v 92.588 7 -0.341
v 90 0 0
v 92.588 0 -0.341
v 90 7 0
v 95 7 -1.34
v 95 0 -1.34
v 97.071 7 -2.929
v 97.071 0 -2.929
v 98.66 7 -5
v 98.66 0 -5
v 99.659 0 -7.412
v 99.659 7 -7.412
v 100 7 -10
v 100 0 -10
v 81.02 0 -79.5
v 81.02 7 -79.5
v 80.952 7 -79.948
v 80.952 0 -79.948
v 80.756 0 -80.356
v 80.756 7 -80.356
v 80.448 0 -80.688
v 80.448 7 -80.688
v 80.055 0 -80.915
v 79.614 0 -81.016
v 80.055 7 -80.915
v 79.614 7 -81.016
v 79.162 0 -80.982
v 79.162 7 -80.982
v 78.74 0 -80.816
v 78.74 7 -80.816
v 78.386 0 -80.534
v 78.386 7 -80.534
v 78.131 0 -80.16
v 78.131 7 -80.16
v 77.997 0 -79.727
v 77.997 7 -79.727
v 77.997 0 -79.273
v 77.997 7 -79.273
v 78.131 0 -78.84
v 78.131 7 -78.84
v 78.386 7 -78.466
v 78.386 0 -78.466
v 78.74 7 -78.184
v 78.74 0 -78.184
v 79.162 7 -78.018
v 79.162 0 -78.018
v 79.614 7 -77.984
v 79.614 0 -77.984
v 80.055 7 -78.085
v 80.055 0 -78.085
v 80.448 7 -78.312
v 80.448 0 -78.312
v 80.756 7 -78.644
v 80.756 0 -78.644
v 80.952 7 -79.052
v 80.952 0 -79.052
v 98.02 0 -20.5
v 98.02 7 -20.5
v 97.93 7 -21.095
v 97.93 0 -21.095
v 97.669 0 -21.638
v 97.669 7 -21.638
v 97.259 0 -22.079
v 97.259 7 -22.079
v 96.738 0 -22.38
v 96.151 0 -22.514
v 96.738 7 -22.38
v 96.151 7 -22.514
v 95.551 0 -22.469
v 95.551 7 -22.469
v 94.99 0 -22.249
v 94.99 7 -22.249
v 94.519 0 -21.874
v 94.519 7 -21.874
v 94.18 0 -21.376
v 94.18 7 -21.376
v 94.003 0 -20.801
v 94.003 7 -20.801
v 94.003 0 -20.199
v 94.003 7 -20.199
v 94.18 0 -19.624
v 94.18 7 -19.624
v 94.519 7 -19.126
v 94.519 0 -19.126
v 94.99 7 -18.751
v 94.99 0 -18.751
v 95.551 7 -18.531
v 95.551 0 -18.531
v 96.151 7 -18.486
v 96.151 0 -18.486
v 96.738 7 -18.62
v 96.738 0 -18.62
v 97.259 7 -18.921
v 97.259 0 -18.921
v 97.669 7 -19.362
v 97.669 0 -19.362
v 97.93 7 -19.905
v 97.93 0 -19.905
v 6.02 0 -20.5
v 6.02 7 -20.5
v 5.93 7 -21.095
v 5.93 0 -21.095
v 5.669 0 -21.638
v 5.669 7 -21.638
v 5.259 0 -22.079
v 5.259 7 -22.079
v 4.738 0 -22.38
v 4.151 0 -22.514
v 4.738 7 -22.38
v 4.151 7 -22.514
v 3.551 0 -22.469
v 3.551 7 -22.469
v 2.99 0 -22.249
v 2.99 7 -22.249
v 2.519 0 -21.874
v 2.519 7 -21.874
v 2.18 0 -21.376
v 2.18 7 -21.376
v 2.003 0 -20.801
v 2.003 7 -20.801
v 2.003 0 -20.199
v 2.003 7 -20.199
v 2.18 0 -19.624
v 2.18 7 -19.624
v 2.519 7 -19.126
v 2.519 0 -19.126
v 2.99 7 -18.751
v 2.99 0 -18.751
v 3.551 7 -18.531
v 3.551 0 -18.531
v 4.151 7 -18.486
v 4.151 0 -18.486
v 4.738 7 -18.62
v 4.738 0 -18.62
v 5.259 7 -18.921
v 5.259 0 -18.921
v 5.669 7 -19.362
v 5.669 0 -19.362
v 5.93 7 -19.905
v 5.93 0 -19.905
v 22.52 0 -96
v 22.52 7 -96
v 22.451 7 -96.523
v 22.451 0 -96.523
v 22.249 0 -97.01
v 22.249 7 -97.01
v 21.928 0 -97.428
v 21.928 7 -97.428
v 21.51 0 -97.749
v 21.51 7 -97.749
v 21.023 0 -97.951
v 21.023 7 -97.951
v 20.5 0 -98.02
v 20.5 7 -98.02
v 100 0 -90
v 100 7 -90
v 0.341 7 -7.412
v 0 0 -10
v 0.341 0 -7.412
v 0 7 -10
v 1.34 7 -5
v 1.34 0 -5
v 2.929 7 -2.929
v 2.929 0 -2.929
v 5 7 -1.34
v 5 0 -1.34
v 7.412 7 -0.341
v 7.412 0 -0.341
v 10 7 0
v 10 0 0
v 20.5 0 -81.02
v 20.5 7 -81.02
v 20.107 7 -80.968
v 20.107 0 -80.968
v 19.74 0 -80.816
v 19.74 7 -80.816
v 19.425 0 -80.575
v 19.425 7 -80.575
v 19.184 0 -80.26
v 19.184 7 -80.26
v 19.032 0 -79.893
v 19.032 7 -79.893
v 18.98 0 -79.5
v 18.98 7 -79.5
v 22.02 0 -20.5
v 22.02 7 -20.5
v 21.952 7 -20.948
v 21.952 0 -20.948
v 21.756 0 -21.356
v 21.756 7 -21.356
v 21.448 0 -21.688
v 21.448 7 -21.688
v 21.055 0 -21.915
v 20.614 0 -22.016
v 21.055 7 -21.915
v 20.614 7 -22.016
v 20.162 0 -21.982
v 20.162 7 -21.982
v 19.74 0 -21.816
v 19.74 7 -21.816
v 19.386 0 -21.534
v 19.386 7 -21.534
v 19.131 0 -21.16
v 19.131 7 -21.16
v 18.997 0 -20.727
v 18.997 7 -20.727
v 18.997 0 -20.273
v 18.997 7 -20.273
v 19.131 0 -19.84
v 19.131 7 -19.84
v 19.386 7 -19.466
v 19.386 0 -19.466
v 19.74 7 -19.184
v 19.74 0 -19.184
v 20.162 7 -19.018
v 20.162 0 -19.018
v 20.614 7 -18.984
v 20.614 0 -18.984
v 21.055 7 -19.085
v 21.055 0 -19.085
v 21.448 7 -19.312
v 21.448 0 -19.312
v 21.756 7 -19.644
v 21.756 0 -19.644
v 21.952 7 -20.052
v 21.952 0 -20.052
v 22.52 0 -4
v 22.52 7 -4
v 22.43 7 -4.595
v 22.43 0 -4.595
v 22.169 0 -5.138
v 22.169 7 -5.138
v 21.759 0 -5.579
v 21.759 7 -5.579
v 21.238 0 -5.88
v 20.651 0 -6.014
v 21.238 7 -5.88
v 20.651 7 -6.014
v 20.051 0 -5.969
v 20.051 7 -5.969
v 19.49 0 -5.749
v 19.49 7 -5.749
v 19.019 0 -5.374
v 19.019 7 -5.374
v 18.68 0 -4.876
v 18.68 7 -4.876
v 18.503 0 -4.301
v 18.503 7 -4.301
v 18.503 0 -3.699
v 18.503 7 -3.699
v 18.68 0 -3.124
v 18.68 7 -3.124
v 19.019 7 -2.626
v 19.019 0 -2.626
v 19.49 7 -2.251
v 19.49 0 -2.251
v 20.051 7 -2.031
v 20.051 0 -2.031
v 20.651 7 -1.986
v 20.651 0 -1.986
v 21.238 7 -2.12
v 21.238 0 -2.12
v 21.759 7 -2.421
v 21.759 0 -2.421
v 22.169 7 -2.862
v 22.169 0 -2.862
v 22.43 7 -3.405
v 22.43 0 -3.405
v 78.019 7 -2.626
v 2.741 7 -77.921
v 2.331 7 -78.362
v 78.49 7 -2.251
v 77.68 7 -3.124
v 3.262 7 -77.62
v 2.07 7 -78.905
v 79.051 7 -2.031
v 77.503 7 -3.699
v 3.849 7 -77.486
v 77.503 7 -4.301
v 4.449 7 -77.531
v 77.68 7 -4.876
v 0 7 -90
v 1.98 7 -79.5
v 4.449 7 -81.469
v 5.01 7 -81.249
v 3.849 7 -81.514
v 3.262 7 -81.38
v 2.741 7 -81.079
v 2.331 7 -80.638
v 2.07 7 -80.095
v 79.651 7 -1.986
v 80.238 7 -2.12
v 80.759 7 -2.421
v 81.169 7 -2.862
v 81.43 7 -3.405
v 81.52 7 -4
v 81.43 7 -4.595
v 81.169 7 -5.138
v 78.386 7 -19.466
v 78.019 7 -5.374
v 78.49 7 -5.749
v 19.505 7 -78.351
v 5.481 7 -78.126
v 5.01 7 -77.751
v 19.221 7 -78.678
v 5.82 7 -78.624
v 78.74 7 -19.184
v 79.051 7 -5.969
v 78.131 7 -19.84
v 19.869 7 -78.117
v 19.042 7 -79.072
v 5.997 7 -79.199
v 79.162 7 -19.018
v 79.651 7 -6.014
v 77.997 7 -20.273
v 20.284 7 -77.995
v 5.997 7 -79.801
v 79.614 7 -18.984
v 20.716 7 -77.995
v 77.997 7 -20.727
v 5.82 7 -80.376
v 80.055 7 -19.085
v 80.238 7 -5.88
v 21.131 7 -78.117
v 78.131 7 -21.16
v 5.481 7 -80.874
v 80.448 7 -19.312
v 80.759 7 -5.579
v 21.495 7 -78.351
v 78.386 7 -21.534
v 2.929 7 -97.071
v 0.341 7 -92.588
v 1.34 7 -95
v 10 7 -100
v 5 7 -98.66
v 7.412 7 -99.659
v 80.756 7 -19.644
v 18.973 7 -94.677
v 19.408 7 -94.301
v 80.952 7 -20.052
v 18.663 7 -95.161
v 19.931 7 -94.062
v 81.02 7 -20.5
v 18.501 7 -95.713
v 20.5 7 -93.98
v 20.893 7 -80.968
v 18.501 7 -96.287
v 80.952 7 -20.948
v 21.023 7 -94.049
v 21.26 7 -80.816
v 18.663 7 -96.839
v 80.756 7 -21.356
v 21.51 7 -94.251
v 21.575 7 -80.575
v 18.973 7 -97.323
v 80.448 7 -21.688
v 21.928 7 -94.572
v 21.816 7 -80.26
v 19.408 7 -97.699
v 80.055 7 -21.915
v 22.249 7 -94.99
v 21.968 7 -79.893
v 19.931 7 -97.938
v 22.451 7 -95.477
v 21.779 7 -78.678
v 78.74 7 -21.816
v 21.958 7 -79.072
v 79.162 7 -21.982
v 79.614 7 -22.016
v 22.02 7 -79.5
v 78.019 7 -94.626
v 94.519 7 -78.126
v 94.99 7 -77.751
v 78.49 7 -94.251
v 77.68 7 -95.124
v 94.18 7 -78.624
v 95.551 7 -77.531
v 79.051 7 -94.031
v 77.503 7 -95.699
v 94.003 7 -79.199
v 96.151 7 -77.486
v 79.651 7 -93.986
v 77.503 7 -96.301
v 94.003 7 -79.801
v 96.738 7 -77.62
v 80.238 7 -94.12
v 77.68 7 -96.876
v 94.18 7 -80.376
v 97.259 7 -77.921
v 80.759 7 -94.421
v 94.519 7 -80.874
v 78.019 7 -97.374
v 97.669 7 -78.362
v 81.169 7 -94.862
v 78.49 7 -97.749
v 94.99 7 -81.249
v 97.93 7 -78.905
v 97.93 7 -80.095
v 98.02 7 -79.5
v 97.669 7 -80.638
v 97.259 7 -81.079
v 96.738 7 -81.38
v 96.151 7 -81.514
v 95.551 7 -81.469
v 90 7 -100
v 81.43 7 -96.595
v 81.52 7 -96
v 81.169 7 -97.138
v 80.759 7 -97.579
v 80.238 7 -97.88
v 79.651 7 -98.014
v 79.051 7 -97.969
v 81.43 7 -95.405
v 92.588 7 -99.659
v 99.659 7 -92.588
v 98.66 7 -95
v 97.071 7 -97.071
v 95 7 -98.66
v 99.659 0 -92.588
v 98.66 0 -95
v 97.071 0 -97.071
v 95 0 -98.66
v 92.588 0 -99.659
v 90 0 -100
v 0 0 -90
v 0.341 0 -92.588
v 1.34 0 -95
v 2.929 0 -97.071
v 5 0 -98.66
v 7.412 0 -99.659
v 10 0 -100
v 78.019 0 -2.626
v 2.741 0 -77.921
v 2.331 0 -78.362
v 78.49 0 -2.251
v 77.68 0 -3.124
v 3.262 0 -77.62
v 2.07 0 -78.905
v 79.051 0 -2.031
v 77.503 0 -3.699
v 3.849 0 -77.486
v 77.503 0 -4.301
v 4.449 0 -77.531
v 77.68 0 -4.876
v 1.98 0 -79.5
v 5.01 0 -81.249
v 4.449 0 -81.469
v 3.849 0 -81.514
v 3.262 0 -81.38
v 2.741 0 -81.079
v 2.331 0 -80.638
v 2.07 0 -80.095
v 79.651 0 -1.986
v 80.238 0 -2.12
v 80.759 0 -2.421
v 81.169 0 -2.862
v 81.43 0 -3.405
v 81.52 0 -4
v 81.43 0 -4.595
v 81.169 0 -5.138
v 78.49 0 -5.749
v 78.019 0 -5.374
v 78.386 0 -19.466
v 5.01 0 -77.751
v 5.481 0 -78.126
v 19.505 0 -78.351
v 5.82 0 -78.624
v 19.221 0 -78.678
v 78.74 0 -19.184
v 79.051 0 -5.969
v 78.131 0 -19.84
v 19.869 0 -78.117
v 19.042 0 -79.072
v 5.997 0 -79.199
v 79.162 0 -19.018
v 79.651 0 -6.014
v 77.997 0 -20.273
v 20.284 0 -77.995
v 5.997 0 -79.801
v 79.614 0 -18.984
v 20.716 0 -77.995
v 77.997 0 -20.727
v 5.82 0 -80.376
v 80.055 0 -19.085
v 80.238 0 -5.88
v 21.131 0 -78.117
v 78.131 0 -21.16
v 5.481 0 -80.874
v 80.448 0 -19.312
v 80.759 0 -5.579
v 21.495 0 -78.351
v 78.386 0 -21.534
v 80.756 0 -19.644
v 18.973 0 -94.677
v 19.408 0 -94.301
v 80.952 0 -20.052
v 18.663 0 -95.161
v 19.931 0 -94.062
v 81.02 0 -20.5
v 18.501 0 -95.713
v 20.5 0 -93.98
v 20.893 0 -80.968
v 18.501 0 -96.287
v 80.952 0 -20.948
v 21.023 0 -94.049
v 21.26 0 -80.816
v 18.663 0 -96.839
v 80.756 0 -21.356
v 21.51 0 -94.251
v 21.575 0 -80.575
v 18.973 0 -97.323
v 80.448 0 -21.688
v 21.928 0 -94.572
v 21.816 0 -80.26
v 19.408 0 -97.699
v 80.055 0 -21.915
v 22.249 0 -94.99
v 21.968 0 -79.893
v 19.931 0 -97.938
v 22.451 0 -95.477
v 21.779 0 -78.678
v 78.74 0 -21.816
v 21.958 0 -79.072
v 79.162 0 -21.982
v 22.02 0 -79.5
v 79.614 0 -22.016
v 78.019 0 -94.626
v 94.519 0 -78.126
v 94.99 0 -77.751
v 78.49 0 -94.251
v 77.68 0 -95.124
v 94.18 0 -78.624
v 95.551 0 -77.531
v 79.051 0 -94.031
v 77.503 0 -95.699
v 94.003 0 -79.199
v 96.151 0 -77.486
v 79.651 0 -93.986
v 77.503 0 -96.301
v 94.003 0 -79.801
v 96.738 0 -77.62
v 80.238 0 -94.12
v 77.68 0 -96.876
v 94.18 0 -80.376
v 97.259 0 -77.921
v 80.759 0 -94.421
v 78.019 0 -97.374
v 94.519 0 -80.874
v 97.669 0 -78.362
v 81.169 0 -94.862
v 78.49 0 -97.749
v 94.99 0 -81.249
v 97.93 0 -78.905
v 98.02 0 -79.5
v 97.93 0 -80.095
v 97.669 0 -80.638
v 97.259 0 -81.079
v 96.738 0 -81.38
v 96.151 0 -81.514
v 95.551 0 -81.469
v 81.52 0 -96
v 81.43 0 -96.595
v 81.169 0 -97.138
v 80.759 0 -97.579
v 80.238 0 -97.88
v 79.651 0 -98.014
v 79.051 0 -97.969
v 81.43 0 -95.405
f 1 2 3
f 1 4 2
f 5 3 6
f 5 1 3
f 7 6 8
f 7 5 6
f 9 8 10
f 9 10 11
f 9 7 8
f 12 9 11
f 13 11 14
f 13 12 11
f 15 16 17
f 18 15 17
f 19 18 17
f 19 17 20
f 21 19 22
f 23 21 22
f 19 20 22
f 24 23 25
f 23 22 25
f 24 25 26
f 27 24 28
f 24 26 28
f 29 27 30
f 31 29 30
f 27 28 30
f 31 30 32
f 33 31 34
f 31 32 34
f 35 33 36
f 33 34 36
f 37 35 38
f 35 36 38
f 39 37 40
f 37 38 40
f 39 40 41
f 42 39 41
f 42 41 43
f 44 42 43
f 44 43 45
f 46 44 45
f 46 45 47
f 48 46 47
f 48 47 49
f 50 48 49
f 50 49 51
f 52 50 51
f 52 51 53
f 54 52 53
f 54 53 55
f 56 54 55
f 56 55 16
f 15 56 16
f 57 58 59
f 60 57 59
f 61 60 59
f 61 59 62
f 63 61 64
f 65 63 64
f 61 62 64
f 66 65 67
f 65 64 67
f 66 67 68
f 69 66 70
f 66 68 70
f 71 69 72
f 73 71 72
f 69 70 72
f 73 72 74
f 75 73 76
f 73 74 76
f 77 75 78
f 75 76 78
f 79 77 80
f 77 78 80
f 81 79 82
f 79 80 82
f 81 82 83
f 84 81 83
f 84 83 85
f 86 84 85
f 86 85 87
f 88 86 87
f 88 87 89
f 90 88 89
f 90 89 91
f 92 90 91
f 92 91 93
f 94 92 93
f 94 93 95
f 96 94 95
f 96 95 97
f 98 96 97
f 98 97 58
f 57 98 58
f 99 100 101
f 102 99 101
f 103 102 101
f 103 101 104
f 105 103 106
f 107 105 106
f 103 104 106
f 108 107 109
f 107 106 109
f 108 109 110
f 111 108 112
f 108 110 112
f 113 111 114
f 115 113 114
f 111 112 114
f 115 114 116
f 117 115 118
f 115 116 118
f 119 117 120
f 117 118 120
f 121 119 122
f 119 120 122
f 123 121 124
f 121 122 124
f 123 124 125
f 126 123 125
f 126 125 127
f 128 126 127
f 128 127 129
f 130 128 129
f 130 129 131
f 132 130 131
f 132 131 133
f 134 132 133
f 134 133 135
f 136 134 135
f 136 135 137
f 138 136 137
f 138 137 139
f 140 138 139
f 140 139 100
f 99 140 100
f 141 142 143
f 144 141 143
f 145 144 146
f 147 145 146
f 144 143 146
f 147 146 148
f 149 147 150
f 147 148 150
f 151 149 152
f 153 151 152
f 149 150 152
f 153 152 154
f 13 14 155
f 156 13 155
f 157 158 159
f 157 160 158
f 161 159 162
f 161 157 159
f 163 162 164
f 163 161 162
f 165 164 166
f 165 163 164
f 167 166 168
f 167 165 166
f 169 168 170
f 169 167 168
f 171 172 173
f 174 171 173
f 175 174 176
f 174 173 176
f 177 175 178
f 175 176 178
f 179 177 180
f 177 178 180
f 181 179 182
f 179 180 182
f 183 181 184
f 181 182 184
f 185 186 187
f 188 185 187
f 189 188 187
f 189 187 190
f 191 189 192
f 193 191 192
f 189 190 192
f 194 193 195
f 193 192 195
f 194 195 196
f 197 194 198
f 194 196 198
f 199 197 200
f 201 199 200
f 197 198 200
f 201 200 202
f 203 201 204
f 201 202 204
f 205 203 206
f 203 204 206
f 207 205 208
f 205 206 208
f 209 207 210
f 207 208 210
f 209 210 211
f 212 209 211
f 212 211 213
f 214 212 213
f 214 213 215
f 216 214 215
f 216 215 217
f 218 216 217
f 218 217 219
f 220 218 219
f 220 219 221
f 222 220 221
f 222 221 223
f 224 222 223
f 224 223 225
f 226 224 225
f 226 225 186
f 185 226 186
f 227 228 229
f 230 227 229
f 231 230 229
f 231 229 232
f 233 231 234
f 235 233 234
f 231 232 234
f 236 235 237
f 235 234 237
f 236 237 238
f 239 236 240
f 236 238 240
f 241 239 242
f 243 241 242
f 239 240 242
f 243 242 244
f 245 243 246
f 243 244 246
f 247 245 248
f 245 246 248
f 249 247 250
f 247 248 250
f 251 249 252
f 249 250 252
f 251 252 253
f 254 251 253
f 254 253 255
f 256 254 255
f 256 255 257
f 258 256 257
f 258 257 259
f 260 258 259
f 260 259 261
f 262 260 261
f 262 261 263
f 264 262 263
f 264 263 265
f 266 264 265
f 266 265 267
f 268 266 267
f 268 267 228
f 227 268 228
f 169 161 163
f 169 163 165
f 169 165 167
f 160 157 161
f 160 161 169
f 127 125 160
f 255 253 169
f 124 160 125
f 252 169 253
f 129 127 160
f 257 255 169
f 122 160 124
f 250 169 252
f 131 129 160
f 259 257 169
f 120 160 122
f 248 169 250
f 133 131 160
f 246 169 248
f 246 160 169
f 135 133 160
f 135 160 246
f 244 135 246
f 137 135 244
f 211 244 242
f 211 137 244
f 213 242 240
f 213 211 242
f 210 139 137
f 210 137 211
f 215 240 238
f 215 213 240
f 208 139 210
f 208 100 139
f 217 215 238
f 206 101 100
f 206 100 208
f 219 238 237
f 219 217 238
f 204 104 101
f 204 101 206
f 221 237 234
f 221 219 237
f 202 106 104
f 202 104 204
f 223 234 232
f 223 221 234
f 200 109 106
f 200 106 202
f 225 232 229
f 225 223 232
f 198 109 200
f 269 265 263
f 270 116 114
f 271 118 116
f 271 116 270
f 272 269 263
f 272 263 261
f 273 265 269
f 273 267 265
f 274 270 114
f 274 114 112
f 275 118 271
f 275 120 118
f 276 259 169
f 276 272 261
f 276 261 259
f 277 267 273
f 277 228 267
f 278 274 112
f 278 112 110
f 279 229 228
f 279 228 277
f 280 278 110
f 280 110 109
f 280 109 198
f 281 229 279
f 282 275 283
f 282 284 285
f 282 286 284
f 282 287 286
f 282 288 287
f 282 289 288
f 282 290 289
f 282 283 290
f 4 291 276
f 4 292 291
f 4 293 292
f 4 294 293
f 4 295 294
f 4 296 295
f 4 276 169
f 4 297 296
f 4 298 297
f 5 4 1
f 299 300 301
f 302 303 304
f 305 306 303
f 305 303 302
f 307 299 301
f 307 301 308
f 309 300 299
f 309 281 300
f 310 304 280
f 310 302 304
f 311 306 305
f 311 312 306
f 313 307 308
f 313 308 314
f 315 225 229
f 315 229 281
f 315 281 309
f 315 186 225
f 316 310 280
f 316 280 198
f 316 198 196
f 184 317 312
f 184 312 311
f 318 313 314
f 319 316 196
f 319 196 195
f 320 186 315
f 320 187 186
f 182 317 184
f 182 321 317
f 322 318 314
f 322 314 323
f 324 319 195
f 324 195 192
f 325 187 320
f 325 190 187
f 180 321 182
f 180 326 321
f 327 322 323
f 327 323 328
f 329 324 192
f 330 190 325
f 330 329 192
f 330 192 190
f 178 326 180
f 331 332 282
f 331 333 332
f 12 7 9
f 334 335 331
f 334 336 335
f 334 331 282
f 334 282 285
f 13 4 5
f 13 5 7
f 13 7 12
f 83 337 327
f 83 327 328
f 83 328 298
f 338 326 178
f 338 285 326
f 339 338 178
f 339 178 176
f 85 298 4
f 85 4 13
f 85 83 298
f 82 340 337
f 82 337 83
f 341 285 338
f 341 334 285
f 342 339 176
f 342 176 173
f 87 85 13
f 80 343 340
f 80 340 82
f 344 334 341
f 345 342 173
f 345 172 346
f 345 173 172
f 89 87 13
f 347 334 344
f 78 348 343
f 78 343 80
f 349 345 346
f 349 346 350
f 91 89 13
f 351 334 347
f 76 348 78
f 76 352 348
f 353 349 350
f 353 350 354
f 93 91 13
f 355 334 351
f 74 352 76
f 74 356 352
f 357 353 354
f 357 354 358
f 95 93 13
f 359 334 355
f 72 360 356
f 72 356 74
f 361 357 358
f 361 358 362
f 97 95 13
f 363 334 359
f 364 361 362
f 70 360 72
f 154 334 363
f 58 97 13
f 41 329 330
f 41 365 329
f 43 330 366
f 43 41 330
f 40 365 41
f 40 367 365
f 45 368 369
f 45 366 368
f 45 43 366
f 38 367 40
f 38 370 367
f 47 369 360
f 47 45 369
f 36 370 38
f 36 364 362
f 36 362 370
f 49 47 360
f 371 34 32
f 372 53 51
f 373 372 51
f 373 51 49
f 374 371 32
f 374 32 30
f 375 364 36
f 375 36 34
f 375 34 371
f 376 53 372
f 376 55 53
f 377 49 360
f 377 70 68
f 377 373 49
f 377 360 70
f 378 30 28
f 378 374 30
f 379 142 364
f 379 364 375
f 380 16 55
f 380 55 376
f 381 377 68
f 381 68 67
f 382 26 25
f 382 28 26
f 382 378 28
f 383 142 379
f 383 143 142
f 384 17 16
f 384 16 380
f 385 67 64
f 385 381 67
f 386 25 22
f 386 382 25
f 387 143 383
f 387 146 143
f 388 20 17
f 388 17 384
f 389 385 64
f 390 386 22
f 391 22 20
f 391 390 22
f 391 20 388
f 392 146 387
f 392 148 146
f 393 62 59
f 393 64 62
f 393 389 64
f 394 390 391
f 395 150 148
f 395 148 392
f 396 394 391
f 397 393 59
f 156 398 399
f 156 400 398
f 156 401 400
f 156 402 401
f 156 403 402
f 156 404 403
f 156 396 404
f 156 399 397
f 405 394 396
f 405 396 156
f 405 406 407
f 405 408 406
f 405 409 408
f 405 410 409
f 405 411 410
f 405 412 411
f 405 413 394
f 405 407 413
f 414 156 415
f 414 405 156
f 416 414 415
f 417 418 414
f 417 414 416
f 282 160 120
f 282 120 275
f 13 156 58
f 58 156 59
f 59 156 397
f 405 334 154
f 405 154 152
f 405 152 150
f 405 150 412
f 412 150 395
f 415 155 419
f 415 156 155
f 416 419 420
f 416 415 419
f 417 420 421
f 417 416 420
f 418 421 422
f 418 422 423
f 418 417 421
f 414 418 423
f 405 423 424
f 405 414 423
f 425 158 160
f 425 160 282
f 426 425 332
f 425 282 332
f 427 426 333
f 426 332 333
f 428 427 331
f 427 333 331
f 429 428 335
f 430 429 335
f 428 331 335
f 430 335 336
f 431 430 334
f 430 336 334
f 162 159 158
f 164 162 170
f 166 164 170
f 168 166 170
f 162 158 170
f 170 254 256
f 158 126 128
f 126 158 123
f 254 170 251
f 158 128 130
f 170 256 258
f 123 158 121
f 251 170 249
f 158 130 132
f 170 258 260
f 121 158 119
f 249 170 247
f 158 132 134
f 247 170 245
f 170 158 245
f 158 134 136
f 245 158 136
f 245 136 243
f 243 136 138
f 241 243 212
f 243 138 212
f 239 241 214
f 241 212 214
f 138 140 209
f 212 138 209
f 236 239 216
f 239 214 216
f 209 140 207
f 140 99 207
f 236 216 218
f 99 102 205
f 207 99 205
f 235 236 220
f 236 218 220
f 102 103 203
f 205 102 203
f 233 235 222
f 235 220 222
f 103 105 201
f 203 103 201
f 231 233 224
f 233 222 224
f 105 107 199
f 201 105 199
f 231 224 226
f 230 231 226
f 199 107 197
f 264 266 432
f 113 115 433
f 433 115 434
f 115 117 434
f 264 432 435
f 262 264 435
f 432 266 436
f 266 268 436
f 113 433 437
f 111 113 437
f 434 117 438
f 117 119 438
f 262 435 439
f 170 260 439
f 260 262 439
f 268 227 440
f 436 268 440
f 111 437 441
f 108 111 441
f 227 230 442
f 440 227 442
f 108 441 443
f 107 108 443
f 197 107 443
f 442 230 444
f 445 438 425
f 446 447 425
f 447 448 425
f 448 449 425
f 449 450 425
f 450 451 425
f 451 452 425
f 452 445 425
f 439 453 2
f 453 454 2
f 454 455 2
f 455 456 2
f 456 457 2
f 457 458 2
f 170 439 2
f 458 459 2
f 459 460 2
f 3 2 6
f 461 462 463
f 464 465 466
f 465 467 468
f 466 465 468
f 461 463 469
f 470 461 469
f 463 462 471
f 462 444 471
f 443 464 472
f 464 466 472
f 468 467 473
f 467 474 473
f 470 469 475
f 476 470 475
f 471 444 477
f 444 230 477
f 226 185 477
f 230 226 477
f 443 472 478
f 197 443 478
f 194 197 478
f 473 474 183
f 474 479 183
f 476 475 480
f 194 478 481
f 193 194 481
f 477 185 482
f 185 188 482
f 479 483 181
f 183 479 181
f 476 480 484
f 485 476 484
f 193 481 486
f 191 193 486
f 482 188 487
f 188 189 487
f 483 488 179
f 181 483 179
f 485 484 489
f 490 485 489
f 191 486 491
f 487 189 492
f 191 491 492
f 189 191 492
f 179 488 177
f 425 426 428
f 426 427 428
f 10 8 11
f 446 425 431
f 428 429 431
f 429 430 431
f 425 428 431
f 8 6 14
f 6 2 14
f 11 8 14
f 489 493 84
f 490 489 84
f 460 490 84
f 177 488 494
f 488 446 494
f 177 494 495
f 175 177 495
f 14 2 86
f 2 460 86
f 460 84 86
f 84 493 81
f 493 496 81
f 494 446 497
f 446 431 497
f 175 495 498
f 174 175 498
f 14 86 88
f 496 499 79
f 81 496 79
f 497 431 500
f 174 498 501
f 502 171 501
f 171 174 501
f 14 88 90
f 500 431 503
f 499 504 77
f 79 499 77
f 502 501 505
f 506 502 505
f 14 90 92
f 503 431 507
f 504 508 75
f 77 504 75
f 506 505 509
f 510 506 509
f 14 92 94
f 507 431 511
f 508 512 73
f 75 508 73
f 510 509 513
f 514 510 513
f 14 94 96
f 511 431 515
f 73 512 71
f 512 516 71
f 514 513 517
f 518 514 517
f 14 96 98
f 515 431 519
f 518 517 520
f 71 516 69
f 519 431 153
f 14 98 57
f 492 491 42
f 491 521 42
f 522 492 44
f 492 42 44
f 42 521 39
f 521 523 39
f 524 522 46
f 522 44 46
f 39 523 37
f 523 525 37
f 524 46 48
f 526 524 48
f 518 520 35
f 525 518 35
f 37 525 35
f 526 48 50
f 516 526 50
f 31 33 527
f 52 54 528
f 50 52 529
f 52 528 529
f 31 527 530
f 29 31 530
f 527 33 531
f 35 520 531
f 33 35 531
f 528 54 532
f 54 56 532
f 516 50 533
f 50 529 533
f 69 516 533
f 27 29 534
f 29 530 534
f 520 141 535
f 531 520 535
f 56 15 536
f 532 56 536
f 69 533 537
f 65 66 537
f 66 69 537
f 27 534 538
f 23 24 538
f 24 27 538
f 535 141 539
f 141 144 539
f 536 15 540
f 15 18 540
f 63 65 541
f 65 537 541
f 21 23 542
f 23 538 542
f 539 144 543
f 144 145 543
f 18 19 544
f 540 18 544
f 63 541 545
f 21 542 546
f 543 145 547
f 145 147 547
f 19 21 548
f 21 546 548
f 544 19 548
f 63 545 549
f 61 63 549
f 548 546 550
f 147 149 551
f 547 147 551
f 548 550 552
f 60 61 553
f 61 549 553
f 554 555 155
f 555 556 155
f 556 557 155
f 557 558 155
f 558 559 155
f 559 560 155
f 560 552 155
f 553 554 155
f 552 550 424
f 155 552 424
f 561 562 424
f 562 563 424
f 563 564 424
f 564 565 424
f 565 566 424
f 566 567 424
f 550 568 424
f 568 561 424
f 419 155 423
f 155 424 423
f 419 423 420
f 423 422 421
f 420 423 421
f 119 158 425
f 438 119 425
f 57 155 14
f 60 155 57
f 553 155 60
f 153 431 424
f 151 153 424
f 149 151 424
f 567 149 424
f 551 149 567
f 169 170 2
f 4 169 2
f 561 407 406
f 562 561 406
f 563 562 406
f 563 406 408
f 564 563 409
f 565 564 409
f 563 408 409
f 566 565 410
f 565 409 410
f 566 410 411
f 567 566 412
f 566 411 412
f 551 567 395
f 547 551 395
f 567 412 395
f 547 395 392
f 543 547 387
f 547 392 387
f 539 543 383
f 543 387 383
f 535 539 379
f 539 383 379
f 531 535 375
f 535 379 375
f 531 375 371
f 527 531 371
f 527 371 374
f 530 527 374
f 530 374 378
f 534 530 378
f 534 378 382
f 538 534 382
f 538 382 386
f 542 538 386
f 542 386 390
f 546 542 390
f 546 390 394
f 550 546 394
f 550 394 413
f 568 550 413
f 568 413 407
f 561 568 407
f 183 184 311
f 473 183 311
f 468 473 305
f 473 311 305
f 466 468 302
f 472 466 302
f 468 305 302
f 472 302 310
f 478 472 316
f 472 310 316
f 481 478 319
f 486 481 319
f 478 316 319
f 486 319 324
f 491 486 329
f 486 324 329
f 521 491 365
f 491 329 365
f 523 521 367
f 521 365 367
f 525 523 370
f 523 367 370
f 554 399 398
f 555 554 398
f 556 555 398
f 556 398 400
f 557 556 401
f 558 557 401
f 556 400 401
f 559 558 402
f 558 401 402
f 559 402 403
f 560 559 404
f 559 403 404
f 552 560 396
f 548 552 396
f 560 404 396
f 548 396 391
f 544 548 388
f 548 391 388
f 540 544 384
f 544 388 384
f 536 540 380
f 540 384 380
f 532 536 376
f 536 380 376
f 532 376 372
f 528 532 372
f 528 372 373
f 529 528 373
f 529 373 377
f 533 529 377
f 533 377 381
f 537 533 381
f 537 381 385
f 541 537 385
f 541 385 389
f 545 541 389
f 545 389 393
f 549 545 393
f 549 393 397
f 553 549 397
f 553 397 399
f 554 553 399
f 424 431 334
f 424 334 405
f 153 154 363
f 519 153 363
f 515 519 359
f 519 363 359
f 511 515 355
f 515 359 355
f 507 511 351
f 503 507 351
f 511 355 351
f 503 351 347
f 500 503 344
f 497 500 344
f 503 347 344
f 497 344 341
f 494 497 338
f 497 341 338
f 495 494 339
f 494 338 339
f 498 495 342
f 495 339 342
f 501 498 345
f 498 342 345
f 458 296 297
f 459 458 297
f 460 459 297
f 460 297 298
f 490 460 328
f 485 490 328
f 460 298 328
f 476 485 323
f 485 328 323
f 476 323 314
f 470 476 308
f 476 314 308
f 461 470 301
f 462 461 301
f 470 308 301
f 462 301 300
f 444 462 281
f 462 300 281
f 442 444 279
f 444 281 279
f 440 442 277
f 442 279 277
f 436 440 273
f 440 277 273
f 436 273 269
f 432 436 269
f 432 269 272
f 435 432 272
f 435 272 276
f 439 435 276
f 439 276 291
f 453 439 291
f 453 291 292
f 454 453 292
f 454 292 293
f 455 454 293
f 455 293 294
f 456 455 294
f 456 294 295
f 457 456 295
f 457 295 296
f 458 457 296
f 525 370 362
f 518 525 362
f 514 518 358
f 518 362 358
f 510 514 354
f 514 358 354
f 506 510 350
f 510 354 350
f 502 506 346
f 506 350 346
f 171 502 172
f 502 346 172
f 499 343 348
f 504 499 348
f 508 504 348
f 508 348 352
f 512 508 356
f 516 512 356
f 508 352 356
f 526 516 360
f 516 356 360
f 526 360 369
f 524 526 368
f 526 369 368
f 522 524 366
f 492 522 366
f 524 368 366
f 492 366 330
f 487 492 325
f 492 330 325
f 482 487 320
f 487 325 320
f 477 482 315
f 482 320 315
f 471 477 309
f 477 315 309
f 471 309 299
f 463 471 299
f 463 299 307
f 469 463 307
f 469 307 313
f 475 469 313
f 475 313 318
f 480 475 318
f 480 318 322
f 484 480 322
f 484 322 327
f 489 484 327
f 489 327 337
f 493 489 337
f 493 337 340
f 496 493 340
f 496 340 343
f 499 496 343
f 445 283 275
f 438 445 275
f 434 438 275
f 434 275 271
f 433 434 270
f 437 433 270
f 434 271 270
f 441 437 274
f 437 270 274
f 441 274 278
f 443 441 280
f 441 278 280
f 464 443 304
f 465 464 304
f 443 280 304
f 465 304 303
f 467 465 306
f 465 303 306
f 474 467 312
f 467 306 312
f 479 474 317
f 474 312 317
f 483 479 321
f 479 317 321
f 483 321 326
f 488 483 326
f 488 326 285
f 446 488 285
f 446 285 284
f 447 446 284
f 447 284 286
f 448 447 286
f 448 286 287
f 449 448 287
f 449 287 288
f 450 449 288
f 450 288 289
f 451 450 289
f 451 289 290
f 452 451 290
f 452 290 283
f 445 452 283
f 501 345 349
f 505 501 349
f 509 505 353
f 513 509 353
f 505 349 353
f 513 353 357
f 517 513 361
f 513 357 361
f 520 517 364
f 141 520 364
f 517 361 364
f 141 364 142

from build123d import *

# Parameters (mm, degrees)
SKETCH_1_W          = 100
SKETCH_1_H          = 100
EXTRUDE_1_DEPTH     = 7
FILLET_1_R          = 10
SKETCH_2_R          = 1.52
SKETCH_2_R_2        = 2.02
CUT_EXTRUDE_2_DEPTH = 13


with BuildPart() as part:
    # 草图1 → 凸台-拉伸1 (new body)
    with BuildSketch(Plane(origin=(0, 0, 0), x_dir=(1, 0, 0), z_dir=(0, 1, 0))):
        with Locations((50, 50)):
            Rectangle(SKETCH_1_W, SKETCH_1_H)
    extrude(amount=EXTRUDE_1_DEPTH)

    # 圆角1
    fillet_1_edges = [part.edges().sort_by_distance(p)[0] for p in [
        (0, 3.5, 0),
        (0, 3.5, -100),
        (100, 3.5, -100),
        (100, 3.5, 0),
    ]]
    fillet(fillet_1_edges, radius=FILLET_1_R)

    # 草图2 → 切除-拉伸2 (cut)
    with BuildSketch(Plane(origin=(0, 7, 0), x_dir=(1, 0, 0), z_dir=(0, 1, 0))):
        with BuildLine():
            ThreePointArc((22.02, 79.5), (21.574802307, 80.574802307), (20.5, 81.02))
            Line((20.5, 81.02), (20.5, 79.5))
            Line((20.5, 79.5), (18.98, 79.5))
            ThreePointArc((18.98, 79.5), (20.5, 77.98), (22.02, 79.5))
        make_face()
        with BuildLine():
            Line((20.5, 79.5), (20.5, 81.02))
            ThreePointArc((20.5, 81.02), (19.425197693, 80.574802307), (18.98, 79.5))
            Line((18.98, 79.5), (20.5, 79.5))
        make_face()
        with BuildLine():
            ThreePointArc((6.02, 79.5), (4, 81.52), (1.98, 79.5))
            Line((1.98, 79.5), (4, 79.5))
            Line((4, 79.5), (6.02, 79.5))
        make_face()
        with BuildLine():
            Line((4, 79.5), (1.98, 79.5))
            ThreePointArc((1.98, 79.5), (4, 77.48), (6.02, 79.5))
            Line((6.02, 79.5), (4, 79.5))
        make_face()
        with BuildLine():
            ThreePointArc((22.52, 96), (21.928355698, 97.428355698), (20.5, 98.02))
            Line((20.5, 98.02), (20.5, 96))
            Line((20.5, 96), (20.5, 93.98))
            ThreePointArc((20.5, 93.98), (21.928355698, 94.571644302), (22.52, 96))
        make_face()
        with BuildLine():
            Line((20.5, 96), (20.5, 98.02))
            ThreePointArc((20.5, 98.02), (18.48, 96), (20.5, 93.98))
            Line((20.5, 93.98), (20.5, 96))
        make_face()
        with Locations((79.5, 79.5)):
            Circle(SKETCH_2_R)
        with Locations((79.5, 96)):
            Circle(SKETCH_2_R_2)
        with Locations((96, 79.5)):
            Circle(SKETCH_2_R_2)
        with Locations((79.5, 20.5)):
            Circle(SKETCH_2_R)
        with Locations((96, 20.5)):
            Circle(SKETCH_2_R_2)
        with Locations((79.5, 4)):
            Circle(SKETCH_2_R_2)
        with Locations((20.5, 20.5)):
            Circle(SKETCH_2_R)
        with Locations((4, 20.5)):
            Circle(SKETCH_2_R_2)
        with Locations((20.5, 4)):
            Circle(SKETCH_2_R_2)
    extrude(amount=-CUT_EXTRUDE_2_DEPTH, mode=Mode.SUBTRACT)


solid = part.part
